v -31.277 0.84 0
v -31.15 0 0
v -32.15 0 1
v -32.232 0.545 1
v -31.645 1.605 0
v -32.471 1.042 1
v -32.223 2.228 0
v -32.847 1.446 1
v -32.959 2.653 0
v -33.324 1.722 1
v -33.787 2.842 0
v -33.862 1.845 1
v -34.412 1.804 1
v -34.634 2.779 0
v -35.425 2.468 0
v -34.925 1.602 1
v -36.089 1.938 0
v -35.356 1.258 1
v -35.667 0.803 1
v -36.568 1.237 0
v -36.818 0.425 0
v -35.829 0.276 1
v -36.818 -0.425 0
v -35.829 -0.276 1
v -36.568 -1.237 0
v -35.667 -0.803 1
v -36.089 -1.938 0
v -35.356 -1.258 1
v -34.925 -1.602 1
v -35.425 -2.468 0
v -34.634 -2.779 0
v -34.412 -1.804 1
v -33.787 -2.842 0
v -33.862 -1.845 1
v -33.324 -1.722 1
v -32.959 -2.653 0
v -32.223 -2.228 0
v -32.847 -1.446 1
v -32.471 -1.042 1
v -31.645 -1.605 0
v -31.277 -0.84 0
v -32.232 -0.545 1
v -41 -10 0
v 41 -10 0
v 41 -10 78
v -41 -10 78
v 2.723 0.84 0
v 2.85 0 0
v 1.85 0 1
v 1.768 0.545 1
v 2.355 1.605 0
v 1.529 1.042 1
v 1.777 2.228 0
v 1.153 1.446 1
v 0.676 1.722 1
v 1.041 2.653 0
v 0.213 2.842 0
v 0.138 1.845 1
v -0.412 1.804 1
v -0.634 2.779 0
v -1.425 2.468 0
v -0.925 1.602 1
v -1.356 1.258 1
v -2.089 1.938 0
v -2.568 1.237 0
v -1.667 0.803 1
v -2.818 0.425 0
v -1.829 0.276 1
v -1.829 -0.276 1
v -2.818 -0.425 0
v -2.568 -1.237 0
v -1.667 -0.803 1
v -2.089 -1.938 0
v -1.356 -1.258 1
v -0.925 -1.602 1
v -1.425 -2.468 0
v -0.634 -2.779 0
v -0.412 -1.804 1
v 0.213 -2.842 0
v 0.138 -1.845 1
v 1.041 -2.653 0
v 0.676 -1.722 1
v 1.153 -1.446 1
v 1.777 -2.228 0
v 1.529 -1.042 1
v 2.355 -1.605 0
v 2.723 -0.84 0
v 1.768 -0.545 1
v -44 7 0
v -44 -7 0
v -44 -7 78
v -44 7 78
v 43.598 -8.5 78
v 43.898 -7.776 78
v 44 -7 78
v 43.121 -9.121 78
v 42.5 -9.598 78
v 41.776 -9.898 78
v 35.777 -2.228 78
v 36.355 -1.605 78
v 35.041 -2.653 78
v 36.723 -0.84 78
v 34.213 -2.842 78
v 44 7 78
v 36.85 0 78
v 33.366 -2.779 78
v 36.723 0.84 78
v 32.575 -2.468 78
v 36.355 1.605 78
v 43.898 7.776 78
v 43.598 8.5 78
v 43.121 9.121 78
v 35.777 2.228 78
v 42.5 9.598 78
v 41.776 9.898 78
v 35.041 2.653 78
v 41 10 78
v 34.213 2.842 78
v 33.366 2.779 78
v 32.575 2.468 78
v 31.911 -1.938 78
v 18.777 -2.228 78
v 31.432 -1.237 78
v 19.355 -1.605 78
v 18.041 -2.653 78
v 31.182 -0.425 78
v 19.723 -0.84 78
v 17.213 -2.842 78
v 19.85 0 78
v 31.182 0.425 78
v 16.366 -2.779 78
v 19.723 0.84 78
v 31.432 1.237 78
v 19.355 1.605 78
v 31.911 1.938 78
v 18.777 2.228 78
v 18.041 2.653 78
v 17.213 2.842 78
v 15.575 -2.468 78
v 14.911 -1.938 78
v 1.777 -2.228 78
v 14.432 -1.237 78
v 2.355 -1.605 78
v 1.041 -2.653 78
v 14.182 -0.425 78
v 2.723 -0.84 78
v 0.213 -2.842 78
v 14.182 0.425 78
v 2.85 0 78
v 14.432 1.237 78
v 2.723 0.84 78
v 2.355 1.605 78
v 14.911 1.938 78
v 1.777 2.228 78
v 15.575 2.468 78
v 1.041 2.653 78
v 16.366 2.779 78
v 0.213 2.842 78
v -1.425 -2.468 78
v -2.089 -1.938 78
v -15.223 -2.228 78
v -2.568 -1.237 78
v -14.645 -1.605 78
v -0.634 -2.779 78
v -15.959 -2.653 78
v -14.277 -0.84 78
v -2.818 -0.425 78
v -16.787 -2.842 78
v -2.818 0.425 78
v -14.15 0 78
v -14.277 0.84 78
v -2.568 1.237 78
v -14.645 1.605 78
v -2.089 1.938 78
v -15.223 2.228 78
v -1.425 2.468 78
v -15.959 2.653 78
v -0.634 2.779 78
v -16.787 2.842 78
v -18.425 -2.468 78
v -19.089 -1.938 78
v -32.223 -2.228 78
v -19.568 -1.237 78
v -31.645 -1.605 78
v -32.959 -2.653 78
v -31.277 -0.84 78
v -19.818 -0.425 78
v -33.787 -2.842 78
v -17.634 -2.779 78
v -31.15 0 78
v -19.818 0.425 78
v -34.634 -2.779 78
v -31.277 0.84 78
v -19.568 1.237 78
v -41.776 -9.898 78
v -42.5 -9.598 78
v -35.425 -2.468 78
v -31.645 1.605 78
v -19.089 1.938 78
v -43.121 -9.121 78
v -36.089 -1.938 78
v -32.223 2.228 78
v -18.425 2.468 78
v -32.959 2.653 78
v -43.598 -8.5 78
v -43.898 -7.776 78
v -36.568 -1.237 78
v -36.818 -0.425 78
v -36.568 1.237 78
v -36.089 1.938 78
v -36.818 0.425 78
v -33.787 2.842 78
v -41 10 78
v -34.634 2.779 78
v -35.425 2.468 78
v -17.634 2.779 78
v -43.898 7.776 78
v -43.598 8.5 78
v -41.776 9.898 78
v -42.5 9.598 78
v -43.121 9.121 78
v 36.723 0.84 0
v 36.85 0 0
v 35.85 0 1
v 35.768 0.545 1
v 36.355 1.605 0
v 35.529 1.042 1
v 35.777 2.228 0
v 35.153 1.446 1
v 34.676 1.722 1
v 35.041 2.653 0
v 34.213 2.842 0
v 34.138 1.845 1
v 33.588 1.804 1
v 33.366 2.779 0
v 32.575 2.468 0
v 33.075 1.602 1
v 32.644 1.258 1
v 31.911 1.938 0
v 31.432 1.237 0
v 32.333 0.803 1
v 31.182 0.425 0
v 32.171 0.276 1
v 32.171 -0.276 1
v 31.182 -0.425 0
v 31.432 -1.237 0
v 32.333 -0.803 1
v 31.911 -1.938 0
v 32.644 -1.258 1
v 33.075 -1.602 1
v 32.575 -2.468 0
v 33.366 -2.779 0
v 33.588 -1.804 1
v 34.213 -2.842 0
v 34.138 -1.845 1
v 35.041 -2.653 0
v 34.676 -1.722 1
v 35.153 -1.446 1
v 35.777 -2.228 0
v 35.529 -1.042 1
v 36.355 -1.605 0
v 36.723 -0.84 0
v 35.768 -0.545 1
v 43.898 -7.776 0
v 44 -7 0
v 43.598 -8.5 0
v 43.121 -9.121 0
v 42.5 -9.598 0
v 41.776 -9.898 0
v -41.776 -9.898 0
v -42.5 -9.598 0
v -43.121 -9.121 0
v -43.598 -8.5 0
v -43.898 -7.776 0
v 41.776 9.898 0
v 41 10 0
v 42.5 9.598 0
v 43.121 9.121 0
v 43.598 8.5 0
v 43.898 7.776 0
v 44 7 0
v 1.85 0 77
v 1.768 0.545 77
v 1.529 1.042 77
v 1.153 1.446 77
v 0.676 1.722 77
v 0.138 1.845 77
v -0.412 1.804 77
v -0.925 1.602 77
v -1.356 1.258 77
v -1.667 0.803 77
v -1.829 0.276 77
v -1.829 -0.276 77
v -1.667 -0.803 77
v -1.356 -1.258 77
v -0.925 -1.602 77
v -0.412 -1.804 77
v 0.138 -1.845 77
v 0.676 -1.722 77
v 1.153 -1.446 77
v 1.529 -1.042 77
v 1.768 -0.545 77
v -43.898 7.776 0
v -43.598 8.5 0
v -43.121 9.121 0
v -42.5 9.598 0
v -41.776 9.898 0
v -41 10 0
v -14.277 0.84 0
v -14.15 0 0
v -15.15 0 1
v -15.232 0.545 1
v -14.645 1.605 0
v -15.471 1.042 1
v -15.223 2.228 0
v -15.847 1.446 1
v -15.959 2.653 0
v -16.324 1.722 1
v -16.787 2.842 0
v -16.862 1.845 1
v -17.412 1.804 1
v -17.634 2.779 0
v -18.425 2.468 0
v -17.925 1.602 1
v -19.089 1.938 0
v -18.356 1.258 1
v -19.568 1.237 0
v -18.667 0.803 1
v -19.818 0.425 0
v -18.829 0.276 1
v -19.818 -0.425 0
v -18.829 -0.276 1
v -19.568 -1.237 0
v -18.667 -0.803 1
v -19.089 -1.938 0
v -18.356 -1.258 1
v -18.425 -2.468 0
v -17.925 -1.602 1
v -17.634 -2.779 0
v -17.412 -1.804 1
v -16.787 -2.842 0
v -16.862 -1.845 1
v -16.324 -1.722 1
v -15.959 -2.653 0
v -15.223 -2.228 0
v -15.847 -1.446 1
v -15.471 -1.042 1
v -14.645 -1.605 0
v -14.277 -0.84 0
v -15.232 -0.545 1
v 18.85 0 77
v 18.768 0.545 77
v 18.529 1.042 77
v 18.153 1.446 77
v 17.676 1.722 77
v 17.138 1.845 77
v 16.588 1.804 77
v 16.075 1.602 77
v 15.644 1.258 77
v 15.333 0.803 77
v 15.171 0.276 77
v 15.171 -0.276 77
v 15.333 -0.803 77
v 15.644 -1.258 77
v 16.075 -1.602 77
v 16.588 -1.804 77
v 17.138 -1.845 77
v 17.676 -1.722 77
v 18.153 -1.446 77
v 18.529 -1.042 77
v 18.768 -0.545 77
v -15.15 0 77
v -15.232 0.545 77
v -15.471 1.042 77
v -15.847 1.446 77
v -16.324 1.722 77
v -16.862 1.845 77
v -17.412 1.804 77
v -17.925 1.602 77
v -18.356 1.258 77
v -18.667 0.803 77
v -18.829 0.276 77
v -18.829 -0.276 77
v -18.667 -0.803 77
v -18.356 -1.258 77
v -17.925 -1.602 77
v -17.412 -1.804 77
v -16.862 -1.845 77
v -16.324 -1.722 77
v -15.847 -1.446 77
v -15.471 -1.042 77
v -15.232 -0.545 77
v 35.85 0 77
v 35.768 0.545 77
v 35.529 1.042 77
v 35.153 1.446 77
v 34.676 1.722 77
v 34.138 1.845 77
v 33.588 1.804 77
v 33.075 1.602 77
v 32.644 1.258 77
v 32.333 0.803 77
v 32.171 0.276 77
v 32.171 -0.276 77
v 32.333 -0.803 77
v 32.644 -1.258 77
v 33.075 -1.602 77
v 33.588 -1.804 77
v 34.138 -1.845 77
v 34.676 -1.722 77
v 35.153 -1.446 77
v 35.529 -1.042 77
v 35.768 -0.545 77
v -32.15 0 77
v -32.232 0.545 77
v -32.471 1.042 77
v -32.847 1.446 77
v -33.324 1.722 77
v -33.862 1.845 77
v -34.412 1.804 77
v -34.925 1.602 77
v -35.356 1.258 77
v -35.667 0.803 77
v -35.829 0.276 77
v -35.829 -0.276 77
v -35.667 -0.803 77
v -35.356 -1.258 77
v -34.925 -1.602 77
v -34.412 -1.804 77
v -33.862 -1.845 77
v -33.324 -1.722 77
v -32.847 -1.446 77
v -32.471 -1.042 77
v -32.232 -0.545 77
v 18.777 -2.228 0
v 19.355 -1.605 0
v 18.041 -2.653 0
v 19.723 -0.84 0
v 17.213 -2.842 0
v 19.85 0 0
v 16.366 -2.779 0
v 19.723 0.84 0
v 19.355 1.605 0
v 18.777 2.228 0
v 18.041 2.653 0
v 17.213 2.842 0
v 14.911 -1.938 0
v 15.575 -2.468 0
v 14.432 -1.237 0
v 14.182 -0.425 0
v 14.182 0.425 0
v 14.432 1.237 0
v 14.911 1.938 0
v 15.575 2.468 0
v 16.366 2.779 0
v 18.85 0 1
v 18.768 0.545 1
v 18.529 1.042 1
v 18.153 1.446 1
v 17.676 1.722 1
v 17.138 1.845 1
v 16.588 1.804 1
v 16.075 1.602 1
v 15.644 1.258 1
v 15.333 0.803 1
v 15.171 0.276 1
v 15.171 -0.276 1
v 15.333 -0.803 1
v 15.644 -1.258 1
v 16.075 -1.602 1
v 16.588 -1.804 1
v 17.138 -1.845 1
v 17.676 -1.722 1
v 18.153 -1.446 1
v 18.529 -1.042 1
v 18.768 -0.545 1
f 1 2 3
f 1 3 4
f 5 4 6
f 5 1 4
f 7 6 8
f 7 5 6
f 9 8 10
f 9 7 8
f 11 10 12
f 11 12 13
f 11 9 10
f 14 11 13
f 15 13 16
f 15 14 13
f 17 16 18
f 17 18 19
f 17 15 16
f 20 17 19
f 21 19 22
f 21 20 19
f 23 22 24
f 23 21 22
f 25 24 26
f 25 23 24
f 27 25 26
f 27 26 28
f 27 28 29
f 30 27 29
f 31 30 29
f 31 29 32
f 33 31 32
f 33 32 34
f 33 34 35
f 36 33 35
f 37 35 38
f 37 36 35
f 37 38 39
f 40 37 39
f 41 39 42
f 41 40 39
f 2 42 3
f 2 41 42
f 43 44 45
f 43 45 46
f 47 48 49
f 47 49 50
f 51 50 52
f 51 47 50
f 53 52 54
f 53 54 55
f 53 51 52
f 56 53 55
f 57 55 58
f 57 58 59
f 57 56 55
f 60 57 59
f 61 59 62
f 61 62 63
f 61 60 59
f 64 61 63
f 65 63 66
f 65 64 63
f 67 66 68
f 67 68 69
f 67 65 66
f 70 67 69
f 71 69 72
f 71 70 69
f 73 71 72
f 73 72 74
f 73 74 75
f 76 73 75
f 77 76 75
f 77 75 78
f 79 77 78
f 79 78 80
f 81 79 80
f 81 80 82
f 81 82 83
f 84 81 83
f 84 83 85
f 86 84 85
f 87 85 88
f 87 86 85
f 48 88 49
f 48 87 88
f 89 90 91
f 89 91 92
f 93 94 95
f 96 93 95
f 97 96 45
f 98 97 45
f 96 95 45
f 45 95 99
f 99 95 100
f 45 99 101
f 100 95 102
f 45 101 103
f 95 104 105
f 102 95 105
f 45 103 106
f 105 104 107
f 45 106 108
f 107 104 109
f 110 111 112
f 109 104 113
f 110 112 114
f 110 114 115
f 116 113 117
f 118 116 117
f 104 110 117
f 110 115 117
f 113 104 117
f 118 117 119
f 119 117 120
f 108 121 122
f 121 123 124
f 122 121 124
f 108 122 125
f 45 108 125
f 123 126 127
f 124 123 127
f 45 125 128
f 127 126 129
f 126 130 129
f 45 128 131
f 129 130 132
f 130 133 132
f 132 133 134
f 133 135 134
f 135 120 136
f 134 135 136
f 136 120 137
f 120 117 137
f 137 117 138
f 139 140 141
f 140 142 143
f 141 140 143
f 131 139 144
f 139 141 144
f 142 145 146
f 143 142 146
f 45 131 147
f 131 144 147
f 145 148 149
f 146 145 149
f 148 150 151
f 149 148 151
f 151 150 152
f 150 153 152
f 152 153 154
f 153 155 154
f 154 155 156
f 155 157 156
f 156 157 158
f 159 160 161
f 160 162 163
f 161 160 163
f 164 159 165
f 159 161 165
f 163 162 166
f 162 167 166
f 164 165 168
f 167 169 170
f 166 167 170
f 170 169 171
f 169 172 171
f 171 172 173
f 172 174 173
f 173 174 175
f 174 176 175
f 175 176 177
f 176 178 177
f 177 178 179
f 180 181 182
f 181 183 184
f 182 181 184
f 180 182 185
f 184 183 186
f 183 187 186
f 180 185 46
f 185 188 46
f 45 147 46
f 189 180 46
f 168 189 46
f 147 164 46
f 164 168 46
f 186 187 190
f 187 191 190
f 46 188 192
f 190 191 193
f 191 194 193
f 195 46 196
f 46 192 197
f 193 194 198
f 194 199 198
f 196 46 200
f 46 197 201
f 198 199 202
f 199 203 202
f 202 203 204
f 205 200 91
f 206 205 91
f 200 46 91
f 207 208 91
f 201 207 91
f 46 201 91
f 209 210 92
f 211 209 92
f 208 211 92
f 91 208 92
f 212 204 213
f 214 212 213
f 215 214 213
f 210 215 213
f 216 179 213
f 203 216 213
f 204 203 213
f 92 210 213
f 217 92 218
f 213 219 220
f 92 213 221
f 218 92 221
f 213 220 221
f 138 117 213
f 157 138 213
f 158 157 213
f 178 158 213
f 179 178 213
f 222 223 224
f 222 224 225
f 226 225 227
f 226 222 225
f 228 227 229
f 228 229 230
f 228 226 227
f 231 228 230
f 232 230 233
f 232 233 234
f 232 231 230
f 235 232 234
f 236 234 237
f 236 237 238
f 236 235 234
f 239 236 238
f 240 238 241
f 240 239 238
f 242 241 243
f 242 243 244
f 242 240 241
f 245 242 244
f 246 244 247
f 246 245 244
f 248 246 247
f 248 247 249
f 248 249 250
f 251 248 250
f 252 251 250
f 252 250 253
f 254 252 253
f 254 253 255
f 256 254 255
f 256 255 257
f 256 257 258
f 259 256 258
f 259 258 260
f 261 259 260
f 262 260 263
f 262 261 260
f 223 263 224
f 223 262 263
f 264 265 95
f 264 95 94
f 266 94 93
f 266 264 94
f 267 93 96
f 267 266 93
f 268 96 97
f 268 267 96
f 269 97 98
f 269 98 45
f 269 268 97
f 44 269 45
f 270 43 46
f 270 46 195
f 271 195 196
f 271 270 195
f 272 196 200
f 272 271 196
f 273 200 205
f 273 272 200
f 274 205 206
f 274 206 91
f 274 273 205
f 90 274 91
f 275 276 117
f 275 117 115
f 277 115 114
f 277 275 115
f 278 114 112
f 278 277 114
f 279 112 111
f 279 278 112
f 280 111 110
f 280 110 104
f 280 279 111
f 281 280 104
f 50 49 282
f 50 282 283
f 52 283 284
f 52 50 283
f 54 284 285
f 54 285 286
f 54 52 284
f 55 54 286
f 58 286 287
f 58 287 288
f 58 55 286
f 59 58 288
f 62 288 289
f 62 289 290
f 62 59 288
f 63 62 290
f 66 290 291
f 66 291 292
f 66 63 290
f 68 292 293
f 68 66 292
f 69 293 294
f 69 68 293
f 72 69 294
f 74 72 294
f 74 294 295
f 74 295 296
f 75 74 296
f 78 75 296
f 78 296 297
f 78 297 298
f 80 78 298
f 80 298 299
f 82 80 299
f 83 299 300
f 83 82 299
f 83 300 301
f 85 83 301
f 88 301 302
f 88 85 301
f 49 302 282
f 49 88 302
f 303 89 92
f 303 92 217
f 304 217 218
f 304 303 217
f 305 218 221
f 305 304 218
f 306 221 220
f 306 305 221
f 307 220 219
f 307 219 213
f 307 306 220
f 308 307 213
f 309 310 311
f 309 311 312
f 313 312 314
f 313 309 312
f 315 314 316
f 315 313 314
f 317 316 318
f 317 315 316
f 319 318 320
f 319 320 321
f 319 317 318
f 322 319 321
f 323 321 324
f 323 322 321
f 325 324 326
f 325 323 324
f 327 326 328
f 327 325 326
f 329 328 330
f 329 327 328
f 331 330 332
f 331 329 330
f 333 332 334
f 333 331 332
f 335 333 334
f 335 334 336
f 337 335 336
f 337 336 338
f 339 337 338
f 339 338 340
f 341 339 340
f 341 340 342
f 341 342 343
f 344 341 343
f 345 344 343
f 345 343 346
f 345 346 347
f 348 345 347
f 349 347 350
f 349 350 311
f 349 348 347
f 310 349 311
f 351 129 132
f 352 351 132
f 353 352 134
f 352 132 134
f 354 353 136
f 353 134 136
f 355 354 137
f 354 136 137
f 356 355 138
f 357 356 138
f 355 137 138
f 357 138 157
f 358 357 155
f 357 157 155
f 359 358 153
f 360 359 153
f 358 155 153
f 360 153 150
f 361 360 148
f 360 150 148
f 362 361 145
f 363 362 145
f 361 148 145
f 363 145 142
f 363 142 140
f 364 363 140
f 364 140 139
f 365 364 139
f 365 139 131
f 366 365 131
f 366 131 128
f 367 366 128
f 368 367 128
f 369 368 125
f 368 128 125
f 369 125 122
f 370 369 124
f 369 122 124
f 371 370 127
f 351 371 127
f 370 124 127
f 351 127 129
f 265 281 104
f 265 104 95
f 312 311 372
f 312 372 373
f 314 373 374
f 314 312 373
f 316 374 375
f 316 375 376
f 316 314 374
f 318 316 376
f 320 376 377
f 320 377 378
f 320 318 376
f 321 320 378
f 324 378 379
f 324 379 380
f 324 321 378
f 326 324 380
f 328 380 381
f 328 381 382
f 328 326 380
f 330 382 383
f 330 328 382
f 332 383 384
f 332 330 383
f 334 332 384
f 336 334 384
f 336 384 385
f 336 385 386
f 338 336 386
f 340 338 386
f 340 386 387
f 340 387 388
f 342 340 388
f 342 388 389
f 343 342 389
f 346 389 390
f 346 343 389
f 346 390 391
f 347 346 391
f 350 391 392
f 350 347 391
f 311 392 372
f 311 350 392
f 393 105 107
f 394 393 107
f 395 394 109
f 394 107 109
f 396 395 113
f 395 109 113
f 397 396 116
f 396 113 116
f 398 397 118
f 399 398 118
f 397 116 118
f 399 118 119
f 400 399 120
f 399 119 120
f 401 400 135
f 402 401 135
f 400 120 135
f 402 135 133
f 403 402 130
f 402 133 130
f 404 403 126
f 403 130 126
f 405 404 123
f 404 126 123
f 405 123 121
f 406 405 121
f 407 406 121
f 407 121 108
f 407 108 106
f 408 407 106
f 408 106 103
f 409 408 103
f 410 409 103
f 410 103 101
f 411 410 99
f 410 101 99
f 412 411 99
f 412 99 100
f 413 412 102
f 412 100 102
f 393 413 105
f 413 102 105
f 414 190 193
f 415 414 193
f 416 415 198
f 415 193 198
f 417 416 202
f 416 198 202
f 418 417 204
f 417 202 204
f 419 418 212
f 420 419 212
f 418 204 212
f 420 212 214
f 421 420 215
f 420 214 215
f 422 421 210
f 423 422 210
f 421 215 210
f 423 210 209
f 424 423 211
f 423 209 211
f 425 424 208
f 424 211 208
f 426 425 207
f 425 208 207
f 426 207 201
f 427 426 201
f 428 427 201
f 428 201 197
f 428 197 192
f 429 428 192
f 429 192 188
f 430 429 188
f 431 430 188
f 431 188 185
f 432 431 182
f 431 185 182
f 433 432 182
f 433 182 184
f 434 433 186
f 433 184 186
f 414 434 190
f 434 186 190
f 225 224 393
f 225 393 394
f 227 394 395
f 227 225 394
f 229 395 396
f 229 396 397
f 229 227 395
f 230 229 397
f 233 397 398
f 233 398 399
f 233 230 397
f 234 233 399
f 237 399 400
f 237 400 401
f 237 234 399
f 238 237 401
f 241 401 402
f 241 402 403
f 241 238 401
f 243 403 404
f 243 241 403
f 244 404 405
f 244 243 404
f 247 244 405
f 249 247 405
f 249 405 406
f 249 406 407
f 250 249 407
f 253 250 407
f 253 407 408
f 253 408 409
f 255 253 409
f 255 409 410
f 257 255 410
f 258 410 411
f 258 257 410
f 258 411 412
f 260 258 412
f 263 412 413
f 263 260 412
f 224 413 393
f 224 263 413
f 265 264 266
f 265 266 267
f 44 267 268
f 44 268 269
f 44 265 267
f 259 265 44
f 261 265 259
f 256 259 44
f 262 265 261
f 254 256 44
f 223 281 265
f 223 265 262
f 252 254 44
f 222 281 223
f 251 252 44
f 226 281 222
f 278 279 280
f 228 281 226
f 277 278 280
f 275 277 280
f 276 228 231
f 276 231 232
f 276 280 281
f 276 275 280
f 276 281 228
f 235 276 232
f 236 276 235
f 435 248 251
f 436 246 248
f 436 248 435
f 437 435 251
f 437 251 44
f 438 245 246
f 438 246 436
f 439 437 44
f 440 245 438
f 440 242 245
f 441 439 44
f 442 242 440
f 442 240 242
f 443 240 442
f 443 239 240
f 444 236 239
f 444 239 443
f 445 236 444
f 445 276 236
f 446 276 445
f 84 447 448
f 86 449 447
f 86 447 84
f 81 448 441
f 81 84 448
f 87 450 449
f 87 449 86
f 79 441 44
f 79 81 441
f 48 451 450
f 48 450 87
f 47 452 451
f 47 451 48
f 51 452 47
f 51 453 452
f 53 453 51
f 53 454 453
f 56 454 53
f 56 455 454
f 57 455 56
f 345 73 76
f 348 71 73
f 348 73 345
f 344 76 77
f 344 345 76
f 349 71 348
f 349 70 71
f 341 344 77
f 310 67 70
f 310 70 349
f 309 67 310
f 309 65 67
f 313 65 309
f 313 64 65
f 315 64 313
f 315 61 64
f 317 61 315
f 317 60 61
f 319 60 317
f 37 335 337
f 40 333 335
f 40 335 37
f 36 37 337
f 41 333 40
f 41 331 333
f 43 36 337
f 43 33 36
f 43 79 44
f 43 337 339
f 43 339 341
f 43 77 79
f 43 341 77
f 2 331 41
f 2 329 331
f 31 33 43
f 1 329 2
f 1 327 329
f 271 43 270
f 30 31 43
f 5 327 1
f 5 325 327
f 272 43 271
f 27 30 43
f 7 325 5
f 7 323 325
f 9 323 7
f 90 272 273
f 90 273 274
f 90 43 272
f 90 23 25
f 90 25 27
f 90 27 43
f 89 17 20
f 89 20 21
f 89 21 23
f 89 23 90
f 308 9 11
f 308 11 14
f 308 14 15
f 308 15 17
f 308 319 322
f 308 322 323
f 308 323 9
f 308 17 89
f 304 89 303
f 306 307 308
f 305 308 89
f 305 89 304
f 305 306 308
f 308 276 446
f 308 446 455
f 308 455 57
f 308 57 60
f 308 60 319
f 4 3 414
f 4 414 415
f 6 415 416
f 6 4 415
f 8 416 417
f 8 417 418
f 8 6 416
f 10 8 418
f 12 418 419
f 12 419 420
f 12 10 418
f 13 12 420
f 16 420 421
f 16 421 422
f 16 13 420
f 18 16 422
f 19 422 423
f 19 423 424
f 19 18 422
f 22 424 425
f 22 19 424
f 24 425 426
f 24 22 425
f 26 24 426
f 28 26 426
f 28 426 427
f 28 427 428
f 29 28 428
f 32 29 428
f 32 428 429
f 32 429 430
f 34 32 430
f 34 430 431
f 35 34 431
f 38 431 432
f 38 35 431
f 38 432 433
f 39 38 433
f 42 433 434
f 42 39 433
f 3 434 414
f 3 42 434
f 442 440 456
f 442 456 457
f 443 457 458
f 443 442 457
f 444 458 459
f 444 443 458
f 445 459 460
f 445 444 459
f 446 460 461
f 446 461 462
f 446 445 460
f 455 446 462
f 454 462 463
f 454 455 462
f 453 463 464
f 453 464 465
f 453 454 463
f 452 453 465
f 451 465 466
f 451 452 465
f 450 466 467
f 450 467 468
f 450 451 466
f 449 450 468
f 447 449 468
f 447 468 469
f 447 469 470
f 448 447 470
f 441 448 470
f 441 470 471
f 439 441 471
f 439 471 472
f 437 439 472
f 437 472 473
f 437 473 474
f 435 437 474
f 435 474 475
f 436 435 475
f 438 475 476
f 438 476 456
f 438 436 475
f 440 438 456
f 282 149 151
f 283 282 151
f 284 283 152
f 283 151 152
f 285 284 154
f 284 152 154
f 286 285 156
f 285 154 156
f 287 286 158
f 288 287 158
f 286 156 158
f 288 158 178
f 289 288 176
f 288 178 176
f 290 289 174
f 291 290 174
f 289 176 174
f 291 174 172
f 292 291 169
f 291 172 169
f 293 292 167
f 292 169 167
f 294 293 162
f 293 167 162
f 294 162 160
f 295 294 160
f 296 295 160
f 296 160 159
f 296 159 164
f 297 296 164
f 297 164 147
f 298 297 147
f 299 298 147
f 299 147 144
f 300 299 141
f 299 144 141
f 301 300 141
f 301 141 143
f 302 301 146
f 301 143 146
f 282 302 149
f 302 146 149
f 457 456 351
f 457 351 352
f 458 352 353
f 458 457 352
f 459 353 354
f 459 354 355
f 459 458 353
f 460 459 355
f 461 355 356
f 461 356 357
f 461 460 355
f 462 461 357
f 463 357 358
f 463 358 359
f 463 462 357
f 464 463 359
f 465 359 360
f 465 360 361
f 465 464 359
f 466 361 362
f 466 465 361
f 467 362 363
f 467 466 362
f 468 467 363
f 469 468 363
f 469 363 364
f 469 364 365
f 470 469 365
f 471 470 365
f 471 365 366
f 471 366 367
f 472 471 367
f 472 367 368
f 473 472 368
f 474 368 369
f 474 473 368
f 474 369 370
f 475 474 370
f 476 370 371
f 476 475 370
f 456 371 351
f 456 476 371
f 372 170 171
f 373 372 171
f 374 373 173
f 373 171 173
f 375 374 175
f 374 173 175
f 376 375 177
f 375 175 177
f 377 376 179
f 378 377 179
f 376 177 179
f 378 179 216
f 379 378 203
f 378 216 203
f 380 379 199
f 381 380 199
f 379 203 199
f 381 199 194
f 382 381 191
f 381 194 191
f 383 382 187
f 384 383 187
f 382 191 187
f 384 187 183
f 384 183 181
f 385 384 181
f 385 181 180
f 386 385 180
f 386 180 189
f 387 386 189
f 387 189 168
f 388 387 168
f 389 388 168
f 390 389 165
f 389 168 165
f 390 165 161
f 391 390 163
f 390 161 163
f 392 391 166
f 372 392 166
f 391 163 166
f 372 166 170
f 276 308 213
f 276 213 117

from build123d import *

# Parameters (mm, degrees)
SKETCH1_R           = 1.85
BOSS_EXTRUDE1_DEPTH = 78
CHAMFER1_SIZE       = 1


with BuildPart() as part:
    # Sketch1 → Boss-Extrude1 (new body)
    with BuildSketch(Plane.XY):
        with BuildLine():
            Line((41, -10), (-41, -10))
            ThreePointArc((-41, -10), (-43.121320344, -9.121320344), (-44, -7))
            Line((-44, -7), (-44, 7))
            ThreePointArc((-44, 7), (-43.121320344, 9.121320344), (-41, 10))
            Line((-41, 10), (41, 10))
            ThreePointArc((41, 10), (43.121320344, 9.121320344), (44, 7))
            Line((44, 7), (44, -7))
            ThreePointArc((44, -7), (43.121320344, -9.121320344), (41, -10))
        make_face()
        with Locations((-34, 0)):
            Circle(SKETCH1_R, mode=Mode.SUBTRACT)
        with Locations((-17, 0)):
            Circle(SKETCH1_R, mode=Mode.SUBTRACT)
        Circle(SKETCH1_R, mode=Mode.SUBTRACT)
        with Locations((17, 0)):
            Circle(SKETCH1_R, mode=Mode.SUBTRACT)
        with Locations((34, 0)):
            Circle(SKETCH1_R, mode=Mode.SUBTRACT)
    extrude(amount=BOSS_EXTRUDE1_DEPTH)

    # Chamfer1
    chamfer1_edges = [part.edges().sort_by_distance(p)[0] for p in [
        (-35.85, 0, 0),
        (-35.85, 0, 78),
        (-18.85, 0, 0),
        (-18.85, 0, 78),
        (-1.85, 0, 0),
        (-1.85, 0, 78),
        (15.15, 0, 0),
        (15.15, 0, 78),
        (32.15, 0, 0),
        (32.15, 0, 78),
    ]]
    chamfer(chamfer1_edges, length=CHAMFER1_SIZE)


solid = part.part
